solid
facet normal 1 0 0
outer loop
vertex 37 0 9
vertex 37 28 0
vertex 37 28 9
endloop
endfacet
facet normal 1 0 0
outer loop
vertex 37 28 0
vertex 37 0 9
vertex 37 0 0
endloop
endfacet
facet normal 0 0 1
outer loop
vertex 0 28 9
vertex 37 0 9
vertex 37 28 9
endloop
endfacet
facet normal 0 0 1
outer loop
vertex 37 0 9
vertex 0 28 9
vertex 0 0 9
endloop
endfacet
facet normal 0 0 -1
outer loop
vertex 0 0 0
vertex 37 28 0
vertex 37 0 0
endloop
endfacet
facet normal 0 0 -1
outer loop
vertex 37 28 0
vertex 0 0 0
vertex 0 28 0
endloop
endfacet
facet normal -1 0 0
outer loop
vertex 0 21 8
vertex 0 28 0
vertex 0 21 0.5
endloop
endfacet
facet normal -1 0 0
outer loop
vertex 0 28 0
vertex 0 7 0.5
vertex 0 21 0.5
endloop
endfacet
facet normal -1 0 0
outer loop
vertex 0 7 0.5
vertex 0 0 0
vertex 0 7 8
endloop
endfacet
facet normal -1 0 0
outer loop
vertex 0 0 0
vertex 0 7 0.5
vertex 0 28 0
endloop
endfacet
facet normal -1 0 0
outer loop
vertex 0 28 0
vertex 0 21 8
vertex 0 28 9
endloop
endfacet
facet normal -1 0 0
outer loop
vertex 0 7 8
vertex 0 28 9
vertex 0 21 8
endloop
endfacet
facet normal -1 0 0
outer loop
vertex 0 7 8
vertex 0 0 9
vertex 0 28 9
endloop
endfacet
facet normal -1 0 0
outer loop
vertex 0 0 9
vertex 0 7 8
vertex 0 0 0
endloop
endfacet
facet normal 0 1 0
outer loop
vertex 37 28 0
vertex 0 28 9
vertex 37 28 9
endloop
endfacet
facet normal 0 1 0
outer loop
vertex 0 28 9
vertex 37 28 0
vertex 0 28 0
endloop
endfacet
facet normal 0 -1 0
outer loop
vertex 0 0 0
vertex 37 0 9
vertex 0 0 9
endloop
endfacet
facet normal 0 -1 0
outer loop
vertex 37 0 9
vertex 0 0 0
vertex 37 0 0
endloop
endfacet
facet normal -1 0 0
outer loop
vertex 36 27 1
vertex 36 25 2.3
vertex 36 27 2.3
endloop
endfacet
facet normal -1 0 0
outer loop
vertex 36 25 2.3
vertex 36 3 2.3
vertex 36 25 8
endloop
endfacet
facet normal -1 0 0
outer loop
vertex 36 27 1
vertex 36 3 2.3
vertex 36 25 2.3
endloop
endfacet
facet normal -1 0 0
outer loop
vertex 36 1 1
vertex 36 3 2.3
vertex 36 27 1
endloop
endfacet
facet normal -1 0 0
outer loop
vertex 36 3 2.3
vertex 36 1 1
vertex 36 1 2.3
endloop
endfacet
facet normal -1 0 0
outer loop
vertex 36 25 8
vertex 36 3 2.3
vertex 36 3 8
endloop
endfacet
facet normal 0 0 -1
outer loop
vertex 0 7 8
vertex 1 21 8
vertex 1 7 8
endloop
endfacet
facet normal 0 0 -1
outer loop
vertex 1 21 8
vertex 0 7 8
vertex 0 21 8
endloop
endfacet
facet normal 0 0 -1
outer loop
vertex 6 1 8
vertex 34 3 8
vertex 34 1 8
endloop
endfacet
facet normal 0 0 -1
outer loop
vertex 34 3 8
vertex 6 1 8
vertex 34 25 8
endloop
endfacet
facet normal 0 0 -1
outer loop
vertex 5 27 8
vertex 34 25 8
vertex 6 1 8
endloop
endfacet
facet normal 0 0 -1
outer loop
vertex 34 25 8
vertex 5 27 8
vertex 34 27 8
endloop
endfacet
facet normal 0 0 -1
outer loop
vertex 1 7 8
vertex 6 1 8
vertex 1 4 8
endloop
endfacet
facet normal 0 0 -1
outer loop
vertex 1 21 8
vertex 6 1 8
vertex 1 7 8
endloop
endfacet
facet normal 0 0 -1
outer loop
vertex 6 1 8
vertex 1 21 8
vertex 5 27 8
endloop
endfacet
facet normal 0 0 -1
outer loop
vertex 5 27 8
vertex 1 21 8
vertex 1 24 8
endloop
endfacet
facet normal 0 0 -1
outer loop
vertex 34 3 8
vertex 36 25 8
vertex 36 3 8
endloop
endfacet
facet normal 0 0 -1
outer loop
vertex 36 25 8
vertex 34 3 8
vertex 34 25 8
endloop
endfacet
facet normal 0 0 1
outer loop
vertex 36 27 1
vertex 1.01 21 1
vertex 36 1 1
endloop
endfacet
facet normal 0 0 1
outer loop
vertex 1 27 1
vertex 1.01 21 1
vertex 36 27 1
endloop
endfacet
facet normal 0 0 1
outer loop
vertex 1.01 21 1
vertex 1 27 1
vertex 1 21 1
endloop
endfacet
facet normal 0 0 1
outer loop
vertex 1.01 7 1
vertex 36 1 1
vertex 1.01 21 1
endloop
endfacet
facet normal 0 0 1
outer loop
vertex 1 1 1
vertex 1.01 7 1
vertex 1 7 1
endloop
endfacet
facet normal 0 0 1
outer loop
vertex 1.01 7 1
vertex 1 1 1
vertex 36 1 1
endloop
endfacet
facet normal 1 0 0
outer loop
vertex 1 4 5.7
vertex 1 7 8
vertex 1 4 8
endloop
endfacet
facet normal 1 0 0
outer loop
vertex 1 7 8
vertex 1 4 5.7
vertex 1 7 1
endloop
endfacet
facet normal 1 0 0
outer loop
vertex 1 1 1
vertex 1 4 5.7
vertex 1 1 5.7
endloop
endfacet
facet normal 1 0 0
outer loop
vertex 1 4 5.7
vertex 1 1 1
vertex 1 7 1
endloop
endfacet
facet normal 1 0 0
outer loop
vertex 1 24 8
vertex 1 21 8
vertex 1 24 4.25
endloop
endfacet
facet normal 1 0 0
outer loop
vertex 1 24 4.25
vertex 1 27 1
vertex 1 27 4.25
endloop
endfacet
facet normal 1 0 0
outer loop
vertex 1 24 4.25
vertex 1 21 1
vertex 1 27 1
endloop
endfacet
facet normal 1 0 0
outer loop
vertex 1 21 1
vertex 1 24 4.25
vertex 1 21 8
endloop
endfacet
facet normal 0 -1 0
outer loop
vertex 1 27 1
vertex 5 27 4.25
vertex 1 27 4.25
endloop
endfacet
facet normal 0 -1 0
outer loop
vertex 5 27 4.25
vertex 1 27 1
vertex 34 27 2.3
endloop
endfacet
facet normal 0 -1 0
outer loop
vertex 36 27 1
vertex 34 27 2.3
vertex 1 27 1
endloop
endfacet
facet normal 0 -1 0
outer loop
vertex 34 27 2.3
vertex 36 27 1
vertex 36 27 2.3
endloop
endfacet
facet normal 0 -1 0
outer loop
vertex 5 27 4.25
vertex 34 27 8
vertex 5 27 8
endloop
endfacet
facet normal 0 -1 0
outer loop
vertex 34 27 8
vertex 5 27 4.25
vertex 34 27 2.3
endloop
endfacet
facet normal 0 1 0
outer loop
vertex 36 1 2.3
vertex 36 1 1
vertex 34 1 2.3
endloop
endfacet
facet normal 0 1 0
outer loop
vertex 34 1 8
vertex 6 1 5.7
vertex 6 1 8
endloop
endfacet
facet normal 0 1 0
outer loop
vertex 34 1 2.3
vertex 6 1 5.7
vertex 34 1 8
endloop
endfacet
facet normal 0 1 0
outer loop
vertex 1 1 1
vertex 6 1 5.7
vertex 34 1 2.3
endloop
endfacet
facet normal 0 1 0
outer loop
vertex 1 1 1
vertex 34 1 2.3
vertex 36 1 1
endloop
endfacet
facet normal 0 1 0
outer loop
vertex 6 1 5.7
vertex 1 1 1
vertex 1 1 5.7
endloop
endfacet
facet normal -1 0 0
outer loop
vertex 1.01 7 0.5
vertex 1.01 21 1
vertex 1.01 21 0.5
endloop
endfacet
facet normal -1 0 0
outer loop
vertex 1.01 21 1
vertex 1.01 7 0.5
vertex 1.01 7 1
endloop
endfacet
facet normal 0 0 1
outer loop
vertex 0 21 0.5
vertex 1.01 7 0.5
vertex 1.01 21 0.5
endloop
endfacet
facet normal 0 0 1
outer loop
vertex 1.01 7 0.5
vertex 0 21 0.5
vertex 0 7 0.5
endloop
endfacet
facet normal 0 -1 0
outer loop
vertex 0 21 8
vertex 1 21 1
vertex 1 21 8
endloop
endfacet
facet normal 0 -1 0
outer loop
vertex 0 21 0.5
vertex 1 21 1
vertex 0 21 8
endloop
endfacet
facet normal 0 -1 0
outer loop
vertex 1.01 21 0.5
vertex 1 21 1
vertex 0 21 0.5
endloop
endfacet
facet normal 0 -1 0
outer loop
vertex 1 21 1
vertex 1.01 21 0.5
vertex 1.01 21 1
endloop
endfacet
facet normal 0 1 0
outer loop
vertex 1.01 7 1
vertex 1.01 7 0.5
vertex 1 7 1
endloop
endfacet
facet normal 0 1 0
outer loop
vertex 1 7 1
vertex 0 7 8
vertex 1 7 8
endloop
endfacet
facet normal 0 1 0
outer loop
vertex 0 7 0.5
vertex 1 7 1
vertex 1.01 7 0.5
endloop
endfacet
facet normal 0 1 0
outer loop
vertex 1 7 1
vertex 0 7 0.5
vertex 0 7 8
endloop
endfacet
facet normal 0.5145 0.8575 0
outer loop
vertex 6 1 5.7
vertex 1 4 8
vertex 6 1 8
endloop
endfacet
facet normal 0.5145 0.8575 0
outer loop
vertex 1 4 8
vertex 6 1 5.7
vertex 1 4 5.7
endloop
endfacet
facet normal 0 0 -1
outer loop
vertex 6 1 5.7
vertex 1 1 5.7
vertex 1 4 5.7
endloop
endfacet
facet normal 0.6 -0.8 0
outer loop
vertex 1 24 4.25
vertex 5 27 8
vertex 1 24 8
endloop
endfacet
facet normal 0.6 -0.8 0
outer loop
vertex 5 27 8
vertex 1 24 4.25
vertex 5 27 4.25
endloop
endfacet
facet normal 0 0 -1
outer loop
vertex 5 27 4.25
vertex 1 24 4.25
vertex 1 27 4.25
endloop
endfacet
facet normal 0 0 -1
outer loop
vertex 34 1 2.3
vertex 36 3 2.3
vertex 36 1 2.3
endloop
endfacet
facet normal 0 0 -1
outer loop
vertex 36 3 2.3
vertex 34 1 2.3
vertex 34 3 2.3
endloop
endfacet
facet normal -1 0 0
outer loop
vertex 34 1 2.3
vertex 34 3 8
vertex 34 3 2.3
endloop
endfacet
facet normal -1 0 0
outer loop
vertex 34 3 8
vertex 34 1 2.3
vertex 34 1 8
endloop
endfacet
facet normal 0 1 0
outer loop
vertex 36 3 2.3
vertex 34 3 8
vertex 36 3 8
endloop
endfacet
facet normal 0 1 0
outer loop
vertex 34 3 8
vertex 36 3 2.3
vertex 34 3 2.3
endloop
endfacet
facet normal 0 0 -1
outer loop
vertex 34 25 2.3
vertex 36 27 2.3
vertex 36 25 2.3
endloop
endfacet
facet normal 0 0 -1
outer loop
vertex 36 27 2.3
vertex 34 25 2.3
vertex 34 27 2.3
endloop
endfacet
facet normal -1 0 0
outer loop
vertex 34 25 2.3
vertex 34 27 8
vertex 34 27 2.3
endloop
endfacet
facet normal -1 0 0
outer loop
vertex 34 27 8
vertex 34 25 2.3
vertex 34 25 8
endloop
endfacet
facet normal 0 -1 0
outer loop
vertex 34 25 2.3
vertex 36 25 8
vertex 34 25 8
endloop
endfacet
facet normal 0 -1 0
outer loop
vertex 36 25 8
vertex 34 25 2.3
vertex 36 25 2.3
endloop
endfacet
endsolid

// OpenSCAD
// ###
// Variablews
// ###

// main variables / parameters
sign_length = 200;
sign_depth = 4;

// other variables
sign_length_offset = 0.5;
strip_height = 5;
strip_width = 12;
sign_rail_socket_width = sign_depth;
sign_rail_socket_height = 15;
wall_thickness = 2;
rail_length = sign_length + sign_length_offset;
rail_width = 35;
rail_wall_height = 20;
rail_height = sign_rail_socket_height + rail_wall_height;
side_wall_thickness = (rail_width-strip_width)/2;
esp_height = 7;
esp_length = 35;
esp_width = 26;
esp_access_z = 1;
esp_access_x = 2;
epsilon = 0.01;
cable_duct_width = 8;
cable_duct_height = 6;
usb_port_width = 14;
usb_port_height = esp_height + 0.5;

// ###
// Modules
// ###

module prism(l, w, h) {
    polyhedron(
        points=[[0,0,0], [l,0,0], [l,w,0], [0,w,0], [0,w,h], [l,w,h]],
        faces=[[0,1,2,3],[5,4,3,2],[0,4,5,1],[0,3,4],[5,2,1]]
    );
};

// integrated side wall
module side_wall() {
    difference() {
        union() {
            cube([wall_thickness, rail_width, rail_wall_height]);
            translate([0, rail_width/2-sign_depth/2, rail_wall_height])
                cube([wall_thickness, sign_depth, sign_rail_socket_height]);
            translate([0, 0, rail_wall_height])
                prism(wall_thickness, rail_width/2-sign_rail_socket_width/2, sign_rail_socket_height);
            translate([0, rail_width/2+sign_depth/2, rail_height])
                rotate([270, 0, 0])
                    prism(wall_thickness, sign_rail_socket_height, rail_width/2-sign_rail_socket_width/2);
        }
    }
}

module esp_tray() {
    difference() {
        cube([esp_length+2, esp_width+2, esp_height+2]);
        translate([1, 1, 1]) {
            cube([esp_length, esp_width, esp_height]);
        }
        // usb port opening
        translate([-epsilon, 1 + (esp_width - usb_port_width) / 2, 1 - 0.5]) {
            cube([1+2*epsilon, usb_port_width, usb_port_height]);
        }
        // lower / z-axis access
        translate([-epsilon, 1 + (esp_width - usb_port_width) / 2, 1 - 0.5]) {
            cube([1+2*epsilon, usb_port_width, usb_port_height]);
        }
    }
    esp_guidance_one_height = esp_height-4.7;
    // esp position guidance
    translate([1, 3+1, 1 + esp_height - esp_guidance_one_height])
        rotate([0, -90, 180])
            prism(esp_guidance_one_height, 3, 5);
    esp_guidance_two_width = 3;
    esp_guidance_two_height = esp_height-3.25;
    translate([5, 1 + 3 + esp_width - esp_guidance_two_width, 1 + esp_height - esp_guidance_two_height])
        rotate([0, -90, 90])
            prism(esp_guidance_two_height, (-1) + 5, esp_guidance_two_width);
    esp_guidance_back_height = esp_height-1.3;
    esp_guidance_back_side = 2;
    translate([1 + esp_length - esp_guidance_back_side, 1, 1 + esp_height - esp_guidance_back_height])
        cube([esp_guidance_back_side, esp_guidance_back_side, esp_guidance_back_height]);
    translate([1 + esp_length - esp_guidance_back_side, 1 + esp_width - esp_guidance_back_side, 1 + esp_height - esp_guidance_back_height])
        cube([esp_guidance_back_side, esp_guidance_back_side, esp_guidance_back_height]);
}

!esp_tray()

// ###
// Model 
// ###

difference() {
    // body
    union() {
        translate([0, side_wall_thickness, 0])
            cube([rail_length, strip_width, rail_wall_height-strip_height]);
        translate([0, 0, 0])
            cube([rail_length, side_wall_thickness, rail_wall_height]);
        translate([0, strip_width+side_wall_thickness, 0])
            cube([rail_length, side_wall_thickness, rail_wall_height]);
    }

    translate([-epsilon, rail_width/2-esp_width/2, (rail_wall_height-strip_height)/2-esp_height/2]) {
        esp_tray();
    }
    // cable duct
    translate([-epsilon, rail_width/2-cable_duct_width/2, 5+epsilon])
        cube([4+epsilon, cable_duct_width, 10]);
}

// prism led rail
translate([0, 0, rail_wall_height])
    prism(rail_length, rail_width/2-sign_rail_socket_width/2, sign_rail_socket_height);
translate([0, rail_width/2+sign_depth/2, rail_height])
    rotate([270, 0, 0])
        prism(rail_length, sign_rail_socket_height, rail_width/2-sign_rail_socket_width/2);

// prism support
translate([0, side_wall_thickness+strip_width/2-sign_depth/2, rail_wall_height])
    rotate([180, 0, 0])
        prism(rail_length, strip_width/2-sign_depth/2, strip_height);
translate([0, side_wall_thickness+strip_width, rail_wall_height-strip_height])
    rotate([90, 0, 0])
        prism(rail_length, strip_height, strip_width/2-sign_depth/2);

translate([rail_length, 0, 0]) {
    side_wall();
}
translate([-wall_thickness, 0, 0]) {
    side_wall();
}
